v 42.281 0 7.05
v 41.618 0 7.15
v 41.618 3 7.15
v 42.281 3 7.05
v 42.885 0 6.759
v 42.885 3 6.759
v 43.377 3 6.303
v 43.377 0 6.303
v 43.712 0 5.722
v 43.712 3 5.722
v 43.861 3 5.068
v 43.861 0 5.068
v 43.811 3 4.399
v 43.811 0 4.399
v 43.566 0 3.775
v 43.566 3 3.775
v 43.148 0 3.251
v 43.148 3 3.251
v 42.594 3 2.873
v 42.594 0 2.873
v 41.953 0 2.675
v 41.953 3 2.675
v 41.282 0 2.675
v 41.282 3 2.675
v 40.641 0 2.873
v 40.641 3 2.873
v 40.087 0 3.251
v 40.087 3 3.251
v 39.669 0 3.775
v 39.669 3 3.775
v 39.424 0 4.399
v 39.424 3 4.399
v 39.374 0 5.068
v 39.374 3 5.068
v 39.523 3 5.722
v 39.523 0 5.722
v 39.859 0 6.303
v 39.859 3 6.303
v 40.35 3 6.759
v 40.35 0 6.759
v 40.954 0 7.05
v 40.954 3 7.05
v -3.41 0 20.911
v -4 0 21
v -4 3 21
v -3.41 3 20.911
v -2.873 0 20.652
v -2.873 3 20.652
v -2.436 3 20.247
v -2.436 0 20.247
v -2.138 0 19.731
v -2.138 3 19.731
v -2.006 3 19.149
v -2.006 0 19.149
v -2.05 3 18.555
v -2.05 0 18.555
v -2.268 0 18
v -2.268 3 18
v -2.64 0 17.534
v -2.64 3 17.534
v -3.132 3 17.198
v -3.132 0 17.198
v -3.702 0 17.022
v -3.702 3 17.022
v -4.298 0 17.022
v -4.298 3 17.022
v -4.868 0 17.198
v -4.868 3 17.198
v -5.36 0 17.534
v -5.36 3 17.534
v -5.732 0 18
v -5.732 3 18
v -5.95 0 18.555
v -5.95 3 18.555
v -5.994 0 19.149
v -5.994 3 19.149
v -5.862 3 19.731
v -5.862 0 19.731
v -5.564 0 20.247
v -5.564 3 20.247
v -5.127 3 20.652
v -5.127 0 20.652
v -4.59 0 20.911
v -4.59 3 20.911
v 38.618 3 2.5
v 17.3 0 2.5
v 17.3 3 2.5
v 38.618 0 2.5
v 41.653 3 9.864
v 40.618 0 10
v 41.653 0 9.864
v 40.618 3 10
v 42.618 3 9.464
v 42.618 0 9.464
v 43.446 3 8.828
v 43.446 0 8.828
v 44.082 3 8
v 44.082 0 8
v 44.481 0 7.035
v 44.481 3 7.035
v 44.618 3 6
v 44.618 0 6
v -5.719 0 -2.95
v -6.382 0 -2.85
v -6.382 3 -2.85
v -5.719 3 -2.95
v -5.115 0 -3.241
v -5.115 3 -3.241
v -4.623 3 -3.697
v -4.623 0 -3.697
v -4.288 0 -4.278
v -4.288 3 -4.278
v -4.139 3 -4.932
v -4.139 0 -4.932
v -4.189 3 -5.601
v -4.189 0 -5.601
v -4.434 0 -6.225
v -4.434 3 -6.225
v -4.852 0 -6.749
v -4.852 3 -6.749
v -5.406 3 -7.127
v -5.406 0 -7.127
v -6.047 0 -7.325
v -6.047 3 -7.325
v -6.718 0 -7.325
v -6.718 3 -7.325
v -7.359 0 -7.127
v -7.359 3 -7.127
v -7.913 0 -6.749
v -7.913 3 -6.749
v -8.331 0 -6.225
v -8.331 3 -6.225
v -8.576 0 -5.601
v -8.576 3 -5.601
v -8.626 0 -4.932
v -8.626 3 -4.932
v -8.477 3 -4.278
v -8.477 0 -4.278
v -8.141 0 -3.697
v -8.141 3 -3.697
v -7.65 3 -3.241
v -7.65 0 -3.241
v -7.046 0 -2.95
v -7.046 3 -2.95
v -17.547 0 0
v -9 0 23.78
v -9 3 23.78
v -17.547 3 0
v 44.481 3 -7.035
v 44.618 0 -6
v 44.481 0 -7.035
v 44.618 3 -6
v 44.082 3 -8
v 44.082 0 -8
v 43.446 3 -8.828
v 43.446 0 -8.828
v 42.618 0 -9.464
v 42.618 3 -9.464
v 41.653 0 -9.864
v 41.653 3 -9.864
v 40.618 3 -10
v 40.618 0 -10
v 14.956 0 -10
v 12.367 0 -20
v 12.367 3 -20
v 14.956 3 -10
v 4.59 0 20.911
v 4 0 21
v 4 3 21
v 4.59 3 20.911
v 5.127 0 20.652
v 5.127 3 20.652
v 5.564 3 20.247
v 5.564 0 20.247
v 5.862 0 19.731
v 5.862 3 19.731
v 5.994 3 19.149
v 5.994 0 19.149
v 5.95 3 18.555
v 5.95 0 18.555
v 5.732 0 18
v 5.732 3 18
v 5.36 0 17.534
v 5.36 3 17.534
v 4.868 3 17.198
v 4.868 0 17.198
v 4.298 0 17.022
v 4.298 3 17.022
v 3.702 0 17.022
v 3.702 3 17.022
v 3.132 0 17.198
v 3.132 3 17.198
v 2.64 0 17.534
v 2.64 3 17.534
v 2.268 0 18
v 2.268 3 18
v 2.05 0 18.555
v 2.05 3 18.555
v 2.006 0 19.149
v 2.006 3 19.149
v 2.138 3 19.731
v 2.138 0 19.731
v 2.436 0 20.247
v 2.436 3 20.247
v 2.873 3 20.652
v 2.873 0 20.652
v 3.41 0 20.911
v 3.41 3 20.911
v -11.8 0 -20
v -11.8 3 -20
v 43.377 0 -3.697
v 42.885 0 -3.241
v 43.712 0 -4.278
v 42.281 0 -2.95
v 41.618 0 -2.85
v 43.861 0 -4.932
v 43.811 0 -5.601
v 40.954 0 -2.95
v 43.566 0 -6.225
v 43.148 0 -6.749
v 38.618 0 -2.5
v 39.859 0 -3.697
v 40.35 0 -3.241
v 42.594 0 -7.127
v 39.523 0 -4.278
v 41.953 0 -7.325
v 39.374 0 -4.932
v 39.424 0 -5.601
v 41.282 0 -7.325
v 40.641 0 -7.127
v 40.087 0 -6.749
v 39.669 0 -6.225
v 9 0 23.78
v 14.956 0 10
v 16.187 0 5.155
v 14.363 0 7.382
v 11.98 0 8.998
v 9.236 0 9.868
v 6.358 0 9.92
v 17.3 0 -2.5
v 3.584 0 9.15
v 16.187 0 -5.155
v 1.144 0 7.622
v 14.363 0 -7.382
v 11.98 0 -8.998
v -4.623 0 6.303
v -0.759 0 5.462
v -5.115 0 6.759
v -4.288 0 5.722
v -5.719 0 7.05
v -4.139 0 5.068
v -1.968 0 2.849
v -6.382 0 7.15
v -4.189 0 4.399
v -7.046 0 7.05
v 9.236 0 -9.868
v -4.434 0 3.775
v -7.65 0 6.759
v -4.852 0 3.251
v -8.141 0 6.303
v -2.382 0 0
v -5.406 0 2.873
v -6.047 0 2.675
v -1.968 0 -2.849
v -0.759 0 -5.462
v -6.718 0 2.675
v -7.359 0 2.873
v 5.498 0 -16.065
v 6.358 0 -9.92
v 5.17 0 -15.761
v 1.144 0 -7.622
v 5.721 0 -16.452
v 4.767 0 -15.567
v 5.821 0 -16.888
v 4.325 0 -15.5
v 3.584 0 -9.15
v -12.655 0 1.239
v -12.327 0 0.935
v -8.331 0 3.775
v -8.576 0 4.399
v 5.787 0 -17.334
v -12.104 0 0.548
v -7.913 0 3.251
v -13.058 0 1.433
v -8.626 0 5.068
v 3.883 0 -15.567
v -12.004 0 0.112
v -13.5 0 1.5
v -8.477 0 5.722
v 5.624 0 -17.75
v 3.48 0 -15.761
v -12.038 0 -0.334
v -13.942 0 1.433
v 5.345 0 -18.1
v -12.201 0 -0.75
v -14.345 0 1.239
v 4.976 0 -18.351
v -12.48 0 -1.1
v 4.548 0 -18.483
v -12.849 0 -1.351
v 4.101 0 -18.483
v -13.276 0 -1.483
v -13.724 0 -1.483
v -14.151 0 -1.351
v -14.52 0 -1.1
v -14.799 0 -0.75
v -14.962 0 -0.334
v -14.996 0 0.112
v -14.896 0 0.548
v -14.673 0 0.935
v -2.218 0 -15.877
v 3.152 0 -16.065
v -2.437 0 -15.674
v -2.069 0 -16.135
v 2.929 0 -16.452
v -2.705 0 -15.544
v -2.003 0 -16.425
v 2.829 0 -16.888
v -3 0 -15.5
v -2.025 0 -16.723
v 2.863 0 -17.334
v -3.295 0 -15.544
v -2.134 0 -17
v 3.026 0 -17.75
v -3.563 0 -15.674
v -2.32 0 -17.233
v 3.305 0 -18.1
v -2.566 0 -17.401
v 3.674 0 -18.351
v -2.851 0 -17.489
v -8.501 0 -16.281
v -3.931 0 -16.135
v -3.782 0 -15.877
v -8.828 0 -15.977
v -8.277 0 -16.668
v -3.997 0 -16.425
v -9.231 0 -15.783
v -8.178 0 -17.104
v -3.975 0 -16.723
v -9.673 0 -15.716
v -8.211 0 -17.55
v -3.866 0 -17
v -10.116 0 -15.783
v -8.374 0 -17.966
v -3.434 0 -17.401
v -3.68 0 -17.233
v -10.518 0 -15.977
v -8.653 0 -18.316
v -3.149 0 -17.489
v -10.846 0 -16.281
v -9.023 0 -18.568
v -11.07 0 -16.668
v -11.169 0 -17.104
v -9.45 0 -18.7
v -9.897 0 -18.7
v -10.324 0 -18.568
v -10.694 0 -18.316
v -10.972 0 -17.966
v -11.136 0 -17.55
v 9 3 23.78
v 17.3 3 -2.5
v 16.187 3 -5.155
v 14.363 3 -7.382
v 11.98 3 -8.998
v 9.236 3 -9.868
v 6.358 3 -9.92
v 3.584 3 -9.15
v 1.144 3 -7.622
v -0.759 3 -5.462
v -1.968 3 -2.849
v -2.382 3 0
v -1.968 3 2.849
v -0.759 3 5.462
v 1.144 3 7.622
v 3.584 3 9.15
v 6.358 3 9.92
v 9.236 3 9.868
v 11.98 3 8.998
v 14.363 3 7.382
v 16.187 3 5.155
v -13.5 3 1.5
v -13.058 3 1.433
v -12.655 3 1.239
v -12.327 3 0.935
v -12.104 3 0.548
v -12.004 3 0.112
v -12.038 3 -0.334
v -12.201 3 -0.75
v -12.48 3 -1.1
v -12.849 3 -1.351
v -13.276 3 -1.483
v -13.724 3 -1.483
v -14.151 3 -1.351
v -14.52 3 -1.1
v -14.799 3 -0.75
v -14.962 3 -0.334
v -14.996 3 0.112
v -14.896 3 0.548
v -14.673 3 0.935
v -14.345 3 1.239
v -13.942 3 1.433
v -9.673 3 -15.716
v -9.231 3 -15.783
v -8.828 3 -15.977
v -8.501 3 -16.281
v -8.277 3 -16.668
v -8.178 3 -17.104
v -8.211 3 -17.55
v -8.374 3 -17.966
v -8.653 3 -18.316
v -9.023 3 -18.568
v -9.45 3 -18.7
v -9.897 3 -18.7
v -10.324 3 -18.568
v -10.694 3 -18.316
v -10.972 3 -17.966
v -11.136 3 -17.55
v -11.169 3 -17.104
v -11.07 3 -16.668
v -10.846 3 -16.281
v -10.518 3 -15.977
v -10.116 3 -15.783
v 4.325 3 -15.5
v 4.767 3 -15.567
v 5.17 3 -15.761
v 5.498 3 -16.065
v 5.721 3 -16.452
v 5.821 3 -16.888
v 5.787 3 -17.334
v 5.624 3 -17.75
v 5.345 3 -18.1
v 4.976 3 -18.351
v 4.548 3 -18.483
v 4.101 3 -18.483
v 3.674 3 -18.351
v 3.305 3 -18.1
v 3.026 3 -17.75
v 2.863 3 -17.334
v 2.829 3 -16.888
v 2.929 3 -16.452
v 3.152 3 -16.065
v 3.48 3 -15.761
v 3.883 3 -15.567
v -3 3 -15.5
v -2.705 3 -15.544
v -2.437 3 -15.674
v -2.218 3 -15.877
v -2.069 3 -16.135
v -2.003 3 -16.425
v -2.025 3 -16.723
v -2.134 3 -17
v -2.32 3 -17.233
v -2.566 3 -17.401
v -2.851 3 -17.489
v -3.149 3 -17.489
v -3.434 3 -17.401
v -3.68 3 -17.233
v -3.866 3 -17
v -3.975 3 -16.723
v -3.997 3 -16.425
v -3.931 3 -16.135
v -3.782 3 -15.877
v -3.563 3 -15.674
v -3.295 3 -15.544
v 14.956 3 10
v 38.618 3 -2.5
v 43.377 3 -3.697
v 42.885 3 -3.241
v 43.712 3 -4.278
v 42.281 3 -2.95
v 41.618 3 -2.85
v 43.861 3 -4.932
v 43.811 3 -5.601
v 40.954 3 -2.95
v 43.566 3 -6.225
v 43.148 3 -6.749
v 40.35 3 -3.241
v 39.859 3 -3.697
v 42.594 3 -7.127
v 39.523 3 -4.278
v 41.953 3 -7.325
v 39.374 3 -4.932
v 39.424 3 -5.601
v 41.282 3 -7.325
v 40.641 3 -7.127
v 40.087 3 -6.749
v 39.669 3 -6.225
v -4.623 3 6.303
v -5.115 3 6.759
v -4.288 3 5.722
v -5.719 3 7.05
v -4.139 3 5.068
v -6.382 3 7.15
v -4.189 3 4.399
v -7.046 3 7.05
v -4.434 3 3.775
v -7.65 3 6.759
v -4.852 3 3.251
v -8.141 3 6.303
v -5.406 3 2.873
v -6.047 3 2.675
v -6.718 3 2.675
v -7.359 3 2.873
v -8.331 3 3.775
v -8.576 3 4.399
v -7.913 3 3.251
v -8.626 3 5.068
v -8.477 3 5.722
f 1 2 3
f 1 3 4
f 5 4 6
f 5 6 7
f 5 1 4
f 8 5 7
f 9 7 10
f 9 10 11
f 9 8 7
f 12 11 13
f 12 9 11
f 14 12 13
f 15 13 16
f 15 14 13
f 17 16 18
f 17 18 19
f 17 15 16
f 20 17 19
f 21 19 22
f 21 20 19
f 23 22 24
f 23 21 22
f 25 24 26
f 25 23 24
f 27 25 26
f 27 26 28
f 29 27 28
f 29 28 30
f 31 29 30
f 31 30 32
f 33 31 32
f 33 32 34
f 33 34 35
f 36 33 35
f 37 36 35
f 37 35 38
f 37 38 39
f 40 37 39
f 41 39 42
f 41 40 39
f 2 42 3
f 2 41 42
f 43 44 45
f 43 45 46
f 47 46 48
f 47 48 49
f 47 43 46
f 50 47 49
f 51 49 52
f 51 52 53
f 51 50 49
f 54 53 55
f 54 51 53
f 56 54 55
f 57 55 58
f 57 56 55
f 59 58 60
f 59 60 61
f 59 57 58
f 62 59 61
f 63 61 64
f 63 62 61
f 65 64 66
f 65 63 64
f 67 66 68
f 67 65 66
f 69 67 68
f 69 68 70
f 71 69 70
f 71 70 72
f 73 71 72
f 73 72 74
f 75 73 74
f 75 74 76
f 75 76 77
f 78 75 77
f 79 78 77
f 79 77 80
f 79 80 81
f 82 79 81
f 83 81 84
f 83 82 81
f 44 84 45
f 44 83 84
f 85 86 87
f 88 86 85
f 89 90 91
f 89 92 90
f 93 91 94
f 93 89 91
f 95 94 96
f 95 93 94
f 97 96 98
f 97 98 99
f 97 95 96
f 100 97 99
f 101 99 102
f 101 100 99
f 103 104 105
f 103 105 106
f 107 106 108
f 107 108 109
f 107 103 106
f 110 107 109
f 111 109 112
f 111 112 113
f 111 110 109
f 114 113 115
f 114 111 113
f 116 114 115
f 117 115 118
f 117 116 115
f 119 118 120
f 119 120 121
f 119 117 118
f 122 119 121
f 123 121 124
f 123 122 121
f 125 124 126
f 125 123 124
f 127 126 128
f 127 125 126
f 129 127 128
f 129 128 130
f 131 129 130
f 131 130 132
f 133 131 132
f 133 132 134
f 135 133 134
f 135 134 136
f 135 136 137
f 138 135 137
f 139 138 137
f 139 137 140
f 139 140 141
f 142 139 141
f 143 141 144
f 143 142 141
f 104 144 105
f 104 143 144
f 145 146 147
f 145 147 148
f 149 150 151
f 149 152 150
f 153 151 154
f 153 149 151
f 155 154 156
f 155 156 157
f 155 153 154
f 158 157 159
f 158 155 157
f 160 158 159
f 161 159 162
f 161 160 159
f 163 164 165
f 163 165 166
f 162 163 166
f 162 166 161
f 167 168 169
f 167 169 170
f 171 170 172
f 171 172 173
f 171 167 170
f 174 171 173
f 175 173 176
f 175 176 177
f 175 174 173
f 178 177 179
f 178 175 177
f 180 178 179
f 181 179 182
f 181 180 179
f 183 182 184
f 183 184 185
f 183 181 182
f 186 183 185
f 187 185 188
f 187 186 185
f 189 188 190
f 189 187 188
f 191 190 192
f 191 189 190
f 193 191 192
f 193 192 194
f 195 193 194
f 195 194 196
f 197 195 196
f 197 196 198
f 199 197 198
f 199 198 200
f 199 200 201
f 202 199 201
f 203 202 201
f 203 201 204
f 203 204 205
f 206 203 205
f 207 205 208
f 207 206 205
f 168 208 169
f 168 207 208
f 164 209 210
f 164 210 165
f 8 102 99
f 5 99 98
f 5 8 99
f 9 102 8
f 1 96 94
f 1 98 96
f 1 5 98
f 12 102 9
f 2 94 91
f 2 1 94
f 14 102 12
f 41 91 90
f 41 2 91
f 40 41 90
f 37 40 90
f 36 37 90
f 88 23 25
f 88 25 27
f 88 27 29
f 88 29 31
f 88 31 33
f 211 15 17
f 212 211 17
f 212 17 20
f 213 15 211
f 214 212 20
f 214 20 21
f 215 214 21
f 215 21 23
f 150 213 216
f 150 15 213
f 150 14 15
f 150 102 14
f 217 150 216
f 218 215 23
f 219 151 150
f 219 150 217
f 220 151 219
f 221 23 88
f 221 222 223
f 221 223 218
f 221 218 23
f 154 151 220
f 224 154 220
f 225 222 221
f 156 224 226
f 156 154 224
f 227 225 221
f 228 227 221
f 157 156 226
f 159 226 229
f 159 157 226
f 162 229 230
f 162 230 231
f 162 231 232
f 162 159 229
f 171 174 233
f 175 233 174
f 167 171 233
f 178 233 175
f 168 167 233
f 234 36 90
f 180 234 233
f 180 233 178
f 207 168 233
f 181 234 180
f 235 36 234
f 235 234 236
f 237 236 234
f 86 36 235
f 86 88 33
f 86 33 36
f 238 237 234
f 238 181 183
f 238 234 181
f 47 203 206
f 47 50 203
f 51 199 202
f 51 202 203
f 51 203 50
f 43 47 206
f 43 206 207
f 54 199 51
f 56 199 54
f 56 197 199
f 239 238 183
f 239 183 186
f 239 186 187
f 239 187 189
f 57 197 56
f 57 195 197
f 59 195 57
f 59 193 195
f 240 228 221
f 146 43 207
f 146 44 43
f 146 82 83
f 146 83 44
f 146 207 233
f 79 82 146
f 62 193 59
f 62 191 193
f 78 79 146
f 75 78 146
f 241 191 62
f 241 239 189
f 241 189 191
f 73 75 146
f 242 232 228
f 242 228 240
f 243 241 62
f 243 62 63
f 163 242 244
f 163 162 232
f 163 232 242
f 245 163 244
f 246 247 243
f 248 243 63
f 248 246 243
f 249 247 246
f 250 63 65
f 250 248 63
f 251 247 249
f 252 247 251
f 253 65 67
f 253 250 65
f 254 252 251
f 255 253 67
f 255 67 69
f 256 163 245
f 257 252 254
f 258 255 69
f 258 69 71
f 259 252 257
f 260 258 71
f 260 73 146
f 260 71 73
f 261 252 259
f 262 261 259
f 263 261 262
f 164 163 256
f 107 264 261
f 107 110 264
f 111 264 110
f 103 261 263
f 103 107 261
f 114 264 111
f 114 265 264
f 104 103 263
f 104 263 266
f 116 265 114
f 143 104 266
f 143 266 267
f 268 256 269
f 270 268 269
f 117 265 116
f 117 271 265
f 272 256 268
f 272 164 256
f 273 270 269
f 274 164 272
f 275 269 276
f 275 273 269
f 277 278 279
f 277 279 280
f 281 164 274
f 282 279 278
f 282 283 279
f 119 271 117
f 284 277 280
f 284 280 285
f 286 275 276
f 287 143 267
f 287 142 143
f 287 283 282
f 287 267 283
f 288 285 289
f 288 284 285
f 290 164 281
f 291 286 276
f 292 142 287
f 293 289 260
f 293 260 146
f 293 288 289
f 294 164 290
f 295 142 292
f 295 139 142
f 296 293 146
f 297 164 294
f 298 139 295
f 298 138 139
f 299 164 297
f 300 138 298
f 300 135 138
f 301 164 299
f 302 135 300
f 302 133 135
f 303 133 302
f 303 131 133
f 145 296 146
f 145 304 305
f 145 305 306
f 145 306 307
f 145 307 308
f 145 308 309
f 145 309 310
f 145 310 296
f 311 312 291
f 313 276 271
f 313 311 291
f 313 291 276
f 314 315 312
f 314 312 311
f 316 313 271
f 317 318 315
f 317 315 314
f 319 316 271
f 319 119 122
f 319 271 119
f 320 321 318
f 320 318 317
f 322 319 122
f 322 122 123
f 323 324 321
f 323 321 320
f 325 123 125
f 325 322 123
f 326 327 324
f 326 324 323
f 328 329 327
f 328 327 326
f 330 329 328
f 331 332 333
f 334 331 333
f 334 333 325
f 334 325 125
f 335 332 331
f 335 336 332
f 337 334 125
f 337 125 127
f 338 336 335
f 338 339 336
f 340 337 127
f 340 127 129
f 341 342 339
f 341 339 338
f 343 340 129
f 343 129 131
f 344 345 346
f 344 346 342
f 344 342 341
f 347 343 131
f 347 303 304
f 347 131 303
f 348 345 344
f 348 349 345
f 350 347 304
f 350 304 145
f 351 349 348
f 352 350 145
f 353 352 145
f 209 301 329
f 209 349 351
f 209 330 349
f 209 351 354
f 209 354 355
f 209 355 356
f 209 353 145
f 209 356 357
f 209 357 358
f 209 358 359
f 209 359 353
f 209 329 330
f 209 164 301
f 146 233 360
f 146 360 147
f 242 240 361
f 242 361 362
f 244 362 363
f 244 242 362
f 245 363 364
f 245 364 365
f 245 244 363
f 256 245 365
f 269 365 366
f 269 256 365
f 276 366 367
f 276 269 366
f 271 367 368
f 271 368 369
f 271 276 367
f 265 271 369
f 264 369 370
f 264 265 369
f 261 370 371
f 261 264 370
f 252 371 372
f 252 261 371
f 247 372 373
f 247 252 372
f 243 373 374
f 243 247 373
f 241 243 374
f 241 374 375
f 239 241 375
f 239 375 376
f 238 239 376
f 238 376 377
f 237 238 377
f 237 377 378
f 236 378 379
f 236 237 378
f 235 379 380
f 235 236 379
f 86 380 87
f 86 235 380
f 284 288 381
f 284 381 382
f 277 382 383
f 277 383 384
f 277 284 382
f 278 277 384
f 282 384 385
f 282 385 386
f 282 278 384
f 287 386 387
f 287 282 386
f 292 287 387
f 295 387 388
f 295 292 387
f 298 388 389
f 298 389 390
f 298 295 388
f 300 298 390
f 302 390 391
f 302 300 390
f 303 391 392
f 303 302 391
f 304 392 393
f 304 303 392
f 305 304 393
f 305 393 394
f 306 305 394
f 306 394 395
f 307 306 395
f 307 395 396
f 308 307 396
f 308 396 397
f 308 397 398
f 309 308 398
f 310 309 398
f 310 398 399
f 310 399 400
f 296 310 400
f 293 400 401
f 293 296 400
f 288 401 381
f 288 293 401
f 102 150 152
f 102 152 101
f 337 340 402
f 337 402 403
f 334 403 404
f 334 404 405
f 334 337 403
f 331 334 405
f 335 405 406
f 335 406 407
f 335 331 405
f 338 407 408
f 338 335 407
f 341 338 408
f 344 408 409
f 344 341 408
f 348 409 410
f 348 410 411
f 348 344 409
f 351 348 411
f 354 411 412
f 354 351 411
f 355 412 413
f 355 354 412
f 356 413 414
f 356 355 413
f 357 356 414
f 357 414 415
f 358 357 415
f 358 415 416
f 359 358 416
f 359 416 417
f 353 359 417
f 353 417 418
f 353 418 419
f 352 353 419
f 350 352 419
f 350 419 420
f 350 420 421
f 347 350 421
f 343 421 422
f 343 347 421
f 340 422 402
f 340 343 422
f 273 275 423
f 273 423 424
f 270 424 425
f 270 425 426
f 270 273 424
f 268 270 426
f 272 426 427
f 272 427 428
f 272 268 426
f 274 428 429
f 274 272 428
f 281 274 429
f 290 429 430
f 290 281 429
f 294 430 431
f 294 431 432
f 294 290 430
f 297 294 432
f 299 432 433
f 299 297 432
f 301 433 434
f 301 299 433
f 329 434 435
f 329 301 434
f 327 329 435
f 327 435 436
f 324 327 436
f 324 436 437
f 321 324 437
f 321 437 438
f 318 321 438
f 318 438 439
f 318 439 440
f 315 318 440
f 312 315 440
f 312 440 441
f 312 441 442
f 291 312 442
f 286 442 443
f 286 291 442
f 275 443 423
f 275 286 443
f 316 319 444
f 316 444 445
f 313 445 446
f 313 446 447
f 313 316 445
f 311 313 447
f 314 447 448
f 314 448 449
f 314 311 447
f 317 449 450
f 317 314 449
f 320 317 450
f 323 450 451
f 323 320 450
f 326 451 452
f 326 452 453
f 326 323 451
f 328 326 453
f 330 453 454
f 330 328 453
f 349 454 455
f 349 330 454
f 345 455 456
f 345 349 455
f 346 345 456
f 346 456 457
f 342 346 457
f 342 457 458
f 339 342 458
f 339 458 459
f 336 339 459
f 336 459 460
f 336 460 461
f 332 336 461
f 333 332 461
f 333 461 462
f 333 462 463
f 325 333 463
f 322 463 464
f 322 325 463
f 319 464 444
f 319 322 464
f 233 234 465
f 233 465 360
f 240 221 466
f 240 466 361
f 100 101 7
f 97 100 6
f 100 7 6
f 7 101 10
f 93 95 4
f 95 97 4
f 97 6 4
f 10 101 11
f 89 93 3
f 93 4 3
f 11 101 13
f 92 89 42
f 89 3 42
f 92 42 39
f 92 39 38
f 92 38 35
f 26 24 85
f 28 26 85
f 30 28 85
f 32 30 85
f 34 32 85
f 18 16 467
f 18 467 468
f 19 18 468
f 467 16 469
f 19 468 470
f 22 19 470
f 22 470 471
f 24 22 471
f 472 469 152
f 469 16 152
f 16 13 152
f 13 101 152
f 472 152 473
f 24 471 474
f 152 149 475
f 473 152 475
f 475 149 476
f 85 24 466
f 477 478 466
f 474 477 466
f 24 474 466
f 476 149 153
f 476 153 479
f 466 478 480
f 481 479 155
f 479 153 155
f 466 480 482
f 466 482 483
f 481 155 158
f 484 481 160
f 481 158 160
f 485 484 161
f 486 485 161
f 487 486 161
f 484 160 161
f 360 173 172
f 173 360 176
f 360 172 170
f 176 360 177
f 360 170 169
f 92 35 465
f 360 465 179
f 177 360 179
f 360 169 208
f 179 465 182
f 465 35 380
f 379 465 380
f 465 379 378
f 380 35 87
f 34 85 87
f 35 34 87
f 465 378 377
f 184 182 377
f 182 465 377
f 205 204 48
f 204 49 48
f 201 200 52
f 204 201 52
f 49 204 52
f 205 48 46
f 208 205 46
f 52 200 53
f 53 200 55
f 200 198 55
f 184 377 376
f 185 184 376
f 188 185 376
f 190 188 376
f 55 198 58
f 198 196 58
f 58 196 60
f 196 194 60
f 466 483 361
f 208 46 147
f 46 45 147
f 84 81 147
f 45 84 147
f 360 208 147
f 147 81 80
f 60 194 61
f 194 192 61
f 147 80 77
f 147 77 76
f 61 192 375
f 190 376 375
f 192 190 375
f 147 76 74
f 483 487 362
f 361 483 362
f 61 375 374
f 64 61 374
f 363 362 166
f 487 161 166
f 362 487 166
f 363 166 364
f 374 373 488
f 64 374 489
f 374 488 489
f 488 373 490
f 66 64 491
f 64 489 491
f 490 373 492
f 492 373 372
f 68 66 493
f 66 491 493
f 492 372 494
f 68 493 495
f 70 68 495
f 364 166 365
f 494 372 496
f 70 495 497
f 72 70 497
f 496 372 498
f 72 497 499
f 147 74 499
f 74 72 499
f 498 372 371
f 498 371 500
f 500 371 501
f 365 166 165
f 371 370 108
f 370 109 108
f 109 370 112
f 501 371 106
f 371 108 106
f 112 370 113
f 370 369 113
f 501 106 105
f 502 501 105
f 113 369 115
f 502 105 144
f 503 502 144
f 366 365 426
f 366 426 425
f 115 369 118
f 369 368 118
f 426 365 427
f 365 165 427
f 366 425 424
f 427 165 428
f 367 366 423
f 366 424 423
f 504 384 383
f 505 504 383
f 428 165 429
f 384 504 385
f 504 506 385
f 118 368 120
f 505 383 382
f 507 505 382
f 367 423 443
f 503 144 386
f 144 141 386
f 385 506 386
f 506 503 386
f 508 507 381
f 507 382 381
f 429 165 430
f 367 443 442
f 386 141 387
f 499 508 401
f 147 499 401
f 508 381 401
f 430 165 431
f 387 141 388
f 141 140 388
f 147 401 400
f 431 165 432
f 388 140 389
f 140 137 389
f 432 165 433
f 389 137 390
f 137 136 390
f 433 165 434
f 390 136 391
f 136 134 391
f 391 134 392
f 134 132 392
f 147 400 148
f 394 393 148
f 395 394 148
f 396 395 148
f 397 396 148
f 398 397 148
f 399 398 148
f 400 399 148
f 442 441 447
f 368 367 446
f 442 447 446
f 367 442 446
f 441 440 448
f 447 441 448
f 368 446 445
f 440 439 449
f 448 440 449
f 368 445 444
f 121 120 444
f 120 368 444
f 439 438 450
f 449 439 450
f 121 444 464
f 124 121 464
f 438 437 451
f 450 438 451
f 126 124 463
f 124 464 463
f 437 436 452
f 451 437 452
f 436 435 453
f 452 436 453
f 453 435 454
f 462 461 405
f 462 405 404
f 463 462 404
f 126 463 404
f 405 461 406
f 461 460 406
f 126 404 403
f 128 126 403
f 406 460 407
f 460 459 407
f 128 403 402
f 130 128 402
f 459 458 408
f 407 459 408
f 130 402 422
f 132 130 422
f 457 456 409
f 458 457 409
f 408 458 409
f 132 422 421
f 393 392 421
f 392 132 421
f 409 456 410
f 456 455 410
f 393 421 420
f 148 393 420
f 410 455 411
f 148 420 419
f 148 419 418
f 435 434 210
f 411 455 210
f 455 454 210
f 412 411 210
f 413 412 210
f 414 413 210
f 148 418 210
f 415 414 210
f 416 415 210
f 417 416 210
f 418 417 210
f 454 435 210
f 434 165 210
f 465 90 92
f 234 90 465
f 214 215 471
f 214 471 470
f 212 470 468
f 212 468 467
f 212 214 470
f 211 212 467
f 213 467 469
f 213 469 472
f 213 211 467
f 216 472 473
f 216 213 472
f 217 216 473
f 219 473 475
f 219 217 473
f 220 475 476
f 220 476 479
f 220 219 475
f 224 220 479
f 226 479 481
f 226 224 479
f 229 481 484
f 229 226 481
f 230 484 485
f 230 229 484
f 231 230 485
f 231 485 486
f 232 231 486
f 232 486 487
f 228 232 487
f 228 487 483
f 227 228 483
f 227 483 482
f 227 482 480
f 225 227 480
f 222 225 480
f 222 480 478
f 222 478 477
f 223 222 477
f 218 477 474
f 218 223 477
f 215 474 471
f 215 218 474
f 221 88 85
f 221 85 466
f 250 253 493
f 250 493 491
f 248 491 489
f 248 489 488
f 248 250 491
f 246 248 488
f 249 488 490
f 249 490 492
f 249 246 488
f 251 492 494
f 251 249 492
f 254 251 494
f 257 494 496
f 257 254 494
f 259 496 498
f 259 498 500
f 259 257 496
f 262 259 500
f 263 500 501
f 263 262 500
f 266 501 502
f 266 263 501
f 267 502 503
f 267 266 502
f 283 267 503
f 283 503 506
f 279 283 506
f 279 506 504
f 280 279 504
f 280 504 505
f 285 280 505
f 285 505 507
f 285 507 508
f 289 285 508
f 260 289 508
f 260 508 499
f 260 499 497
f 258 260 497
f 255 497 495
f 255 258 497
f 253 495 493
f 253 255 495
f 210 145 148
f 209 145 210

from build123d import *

# Parameters (mm, degrees)
SKETCH_1_R      = 2
SKETCH_1_R_2    = 1
SKETCH_1_R_3    = 1.5
SKETCH_1_R_4    = 2.25
EXTRUDE_1_DEPTH = 3
FILLET_1_R      = 4


with BuildPart() as part:
    # 草图1 → 凸台-拉伸1 (new body)
    with BuildSketch(Plane(origin=(0, 0, 0), x_dir=(1, 0, 0), z_dir=(0, 1, 0))):
        Polygon((-9, -23.780312322), (-17.547496939, 0), (-11.800187967, 20), (12.367390868, 20), (14.956440464, 10), (44.617690385, 10), (44.617690385, -10), (14.956440464, -10), (9, -23.780312322), align=None)
        with Locations(Location((-4, -19, 0), (0, 0, 270))):
            Circle(SKETCH_1_R, mode=Mode.SUBTRACT)
        with Locations(Location((4, -19, 0), (0, 0, 270))):
            Circle(SKETCH_1_R, mode=Mode.SUBTRACT)
        with Locations(Location((-3, 16.5, 0), (0, 0, 270))):
            Circle(SKETCH_1_R_2, mode=Mode.SUBTRACT)
        with Locations(Location((4.324928848, 17, 0), (0, 0, 270))):
            Circle(SKETCH_1_R_3, mode=Mode.SUBTRACT)
        with Locations(Location((41.617690385, 5.1, 0), (0, 0, 270))):
            Circle(SKETCH_1_R_4, mode=Mode.SUBTRACT)
        with Locations(Location((41.617690385, -4.9, 0), (0, 0, 270))):
            Circle(SKETCH_1_R_4, mode=Mode.SUBTRACT)
        with Locations(Location((-6.382309615, -4.9, 0), (0, 0, 270))):
            Circle(SKETCH_1_R_4, mode=Mode.SUBTRACT)
        with Locations(Location((-6.382309615, 5.1, 0), (0, 0, 270))):
            Circle(SKETCH_1_R_4, mode=Mode.SUBTRACT)
        with Locations(Location((-13.5, 0, 0), (0, 0, 270))):
            Circle(SKETCH_1_R_3, mode=Mode.SUBTRACT)
        with Locations(Location((-9.67339824, 17.216422607, 0), (0, 0, 270))):
            Circle(SKETCH_1_R_3, mode=Mode.SUBTRACT)
        with BuildLine():
            Line((17.30014875, -2.5), (38.617690385, -2.5))
            Line((38.617690385, -2.5), (38.617690385, 2.5))
            Line((38.617690385, 2.5), (17.30014875, 2.5))
            ThreePointArc((17.30014875, 2.5), (-2.382309615, 0), (17.30014875, -2.5))
        make_face(mode=Mode.SUBTRACT)
    extrude(amount=EXTRUDE_1_DEPTH)

    # 圆角1
    fillet_1_edges = [part.edges().sort_by_distance(p)[0] for p in [
        (44.617690385, 1.5, -10),
        (44.617690385, 1.5, 10),
    ]]
    fillet(fillet_1_edges, radius=FILLET_1_R)


solid = part.part
